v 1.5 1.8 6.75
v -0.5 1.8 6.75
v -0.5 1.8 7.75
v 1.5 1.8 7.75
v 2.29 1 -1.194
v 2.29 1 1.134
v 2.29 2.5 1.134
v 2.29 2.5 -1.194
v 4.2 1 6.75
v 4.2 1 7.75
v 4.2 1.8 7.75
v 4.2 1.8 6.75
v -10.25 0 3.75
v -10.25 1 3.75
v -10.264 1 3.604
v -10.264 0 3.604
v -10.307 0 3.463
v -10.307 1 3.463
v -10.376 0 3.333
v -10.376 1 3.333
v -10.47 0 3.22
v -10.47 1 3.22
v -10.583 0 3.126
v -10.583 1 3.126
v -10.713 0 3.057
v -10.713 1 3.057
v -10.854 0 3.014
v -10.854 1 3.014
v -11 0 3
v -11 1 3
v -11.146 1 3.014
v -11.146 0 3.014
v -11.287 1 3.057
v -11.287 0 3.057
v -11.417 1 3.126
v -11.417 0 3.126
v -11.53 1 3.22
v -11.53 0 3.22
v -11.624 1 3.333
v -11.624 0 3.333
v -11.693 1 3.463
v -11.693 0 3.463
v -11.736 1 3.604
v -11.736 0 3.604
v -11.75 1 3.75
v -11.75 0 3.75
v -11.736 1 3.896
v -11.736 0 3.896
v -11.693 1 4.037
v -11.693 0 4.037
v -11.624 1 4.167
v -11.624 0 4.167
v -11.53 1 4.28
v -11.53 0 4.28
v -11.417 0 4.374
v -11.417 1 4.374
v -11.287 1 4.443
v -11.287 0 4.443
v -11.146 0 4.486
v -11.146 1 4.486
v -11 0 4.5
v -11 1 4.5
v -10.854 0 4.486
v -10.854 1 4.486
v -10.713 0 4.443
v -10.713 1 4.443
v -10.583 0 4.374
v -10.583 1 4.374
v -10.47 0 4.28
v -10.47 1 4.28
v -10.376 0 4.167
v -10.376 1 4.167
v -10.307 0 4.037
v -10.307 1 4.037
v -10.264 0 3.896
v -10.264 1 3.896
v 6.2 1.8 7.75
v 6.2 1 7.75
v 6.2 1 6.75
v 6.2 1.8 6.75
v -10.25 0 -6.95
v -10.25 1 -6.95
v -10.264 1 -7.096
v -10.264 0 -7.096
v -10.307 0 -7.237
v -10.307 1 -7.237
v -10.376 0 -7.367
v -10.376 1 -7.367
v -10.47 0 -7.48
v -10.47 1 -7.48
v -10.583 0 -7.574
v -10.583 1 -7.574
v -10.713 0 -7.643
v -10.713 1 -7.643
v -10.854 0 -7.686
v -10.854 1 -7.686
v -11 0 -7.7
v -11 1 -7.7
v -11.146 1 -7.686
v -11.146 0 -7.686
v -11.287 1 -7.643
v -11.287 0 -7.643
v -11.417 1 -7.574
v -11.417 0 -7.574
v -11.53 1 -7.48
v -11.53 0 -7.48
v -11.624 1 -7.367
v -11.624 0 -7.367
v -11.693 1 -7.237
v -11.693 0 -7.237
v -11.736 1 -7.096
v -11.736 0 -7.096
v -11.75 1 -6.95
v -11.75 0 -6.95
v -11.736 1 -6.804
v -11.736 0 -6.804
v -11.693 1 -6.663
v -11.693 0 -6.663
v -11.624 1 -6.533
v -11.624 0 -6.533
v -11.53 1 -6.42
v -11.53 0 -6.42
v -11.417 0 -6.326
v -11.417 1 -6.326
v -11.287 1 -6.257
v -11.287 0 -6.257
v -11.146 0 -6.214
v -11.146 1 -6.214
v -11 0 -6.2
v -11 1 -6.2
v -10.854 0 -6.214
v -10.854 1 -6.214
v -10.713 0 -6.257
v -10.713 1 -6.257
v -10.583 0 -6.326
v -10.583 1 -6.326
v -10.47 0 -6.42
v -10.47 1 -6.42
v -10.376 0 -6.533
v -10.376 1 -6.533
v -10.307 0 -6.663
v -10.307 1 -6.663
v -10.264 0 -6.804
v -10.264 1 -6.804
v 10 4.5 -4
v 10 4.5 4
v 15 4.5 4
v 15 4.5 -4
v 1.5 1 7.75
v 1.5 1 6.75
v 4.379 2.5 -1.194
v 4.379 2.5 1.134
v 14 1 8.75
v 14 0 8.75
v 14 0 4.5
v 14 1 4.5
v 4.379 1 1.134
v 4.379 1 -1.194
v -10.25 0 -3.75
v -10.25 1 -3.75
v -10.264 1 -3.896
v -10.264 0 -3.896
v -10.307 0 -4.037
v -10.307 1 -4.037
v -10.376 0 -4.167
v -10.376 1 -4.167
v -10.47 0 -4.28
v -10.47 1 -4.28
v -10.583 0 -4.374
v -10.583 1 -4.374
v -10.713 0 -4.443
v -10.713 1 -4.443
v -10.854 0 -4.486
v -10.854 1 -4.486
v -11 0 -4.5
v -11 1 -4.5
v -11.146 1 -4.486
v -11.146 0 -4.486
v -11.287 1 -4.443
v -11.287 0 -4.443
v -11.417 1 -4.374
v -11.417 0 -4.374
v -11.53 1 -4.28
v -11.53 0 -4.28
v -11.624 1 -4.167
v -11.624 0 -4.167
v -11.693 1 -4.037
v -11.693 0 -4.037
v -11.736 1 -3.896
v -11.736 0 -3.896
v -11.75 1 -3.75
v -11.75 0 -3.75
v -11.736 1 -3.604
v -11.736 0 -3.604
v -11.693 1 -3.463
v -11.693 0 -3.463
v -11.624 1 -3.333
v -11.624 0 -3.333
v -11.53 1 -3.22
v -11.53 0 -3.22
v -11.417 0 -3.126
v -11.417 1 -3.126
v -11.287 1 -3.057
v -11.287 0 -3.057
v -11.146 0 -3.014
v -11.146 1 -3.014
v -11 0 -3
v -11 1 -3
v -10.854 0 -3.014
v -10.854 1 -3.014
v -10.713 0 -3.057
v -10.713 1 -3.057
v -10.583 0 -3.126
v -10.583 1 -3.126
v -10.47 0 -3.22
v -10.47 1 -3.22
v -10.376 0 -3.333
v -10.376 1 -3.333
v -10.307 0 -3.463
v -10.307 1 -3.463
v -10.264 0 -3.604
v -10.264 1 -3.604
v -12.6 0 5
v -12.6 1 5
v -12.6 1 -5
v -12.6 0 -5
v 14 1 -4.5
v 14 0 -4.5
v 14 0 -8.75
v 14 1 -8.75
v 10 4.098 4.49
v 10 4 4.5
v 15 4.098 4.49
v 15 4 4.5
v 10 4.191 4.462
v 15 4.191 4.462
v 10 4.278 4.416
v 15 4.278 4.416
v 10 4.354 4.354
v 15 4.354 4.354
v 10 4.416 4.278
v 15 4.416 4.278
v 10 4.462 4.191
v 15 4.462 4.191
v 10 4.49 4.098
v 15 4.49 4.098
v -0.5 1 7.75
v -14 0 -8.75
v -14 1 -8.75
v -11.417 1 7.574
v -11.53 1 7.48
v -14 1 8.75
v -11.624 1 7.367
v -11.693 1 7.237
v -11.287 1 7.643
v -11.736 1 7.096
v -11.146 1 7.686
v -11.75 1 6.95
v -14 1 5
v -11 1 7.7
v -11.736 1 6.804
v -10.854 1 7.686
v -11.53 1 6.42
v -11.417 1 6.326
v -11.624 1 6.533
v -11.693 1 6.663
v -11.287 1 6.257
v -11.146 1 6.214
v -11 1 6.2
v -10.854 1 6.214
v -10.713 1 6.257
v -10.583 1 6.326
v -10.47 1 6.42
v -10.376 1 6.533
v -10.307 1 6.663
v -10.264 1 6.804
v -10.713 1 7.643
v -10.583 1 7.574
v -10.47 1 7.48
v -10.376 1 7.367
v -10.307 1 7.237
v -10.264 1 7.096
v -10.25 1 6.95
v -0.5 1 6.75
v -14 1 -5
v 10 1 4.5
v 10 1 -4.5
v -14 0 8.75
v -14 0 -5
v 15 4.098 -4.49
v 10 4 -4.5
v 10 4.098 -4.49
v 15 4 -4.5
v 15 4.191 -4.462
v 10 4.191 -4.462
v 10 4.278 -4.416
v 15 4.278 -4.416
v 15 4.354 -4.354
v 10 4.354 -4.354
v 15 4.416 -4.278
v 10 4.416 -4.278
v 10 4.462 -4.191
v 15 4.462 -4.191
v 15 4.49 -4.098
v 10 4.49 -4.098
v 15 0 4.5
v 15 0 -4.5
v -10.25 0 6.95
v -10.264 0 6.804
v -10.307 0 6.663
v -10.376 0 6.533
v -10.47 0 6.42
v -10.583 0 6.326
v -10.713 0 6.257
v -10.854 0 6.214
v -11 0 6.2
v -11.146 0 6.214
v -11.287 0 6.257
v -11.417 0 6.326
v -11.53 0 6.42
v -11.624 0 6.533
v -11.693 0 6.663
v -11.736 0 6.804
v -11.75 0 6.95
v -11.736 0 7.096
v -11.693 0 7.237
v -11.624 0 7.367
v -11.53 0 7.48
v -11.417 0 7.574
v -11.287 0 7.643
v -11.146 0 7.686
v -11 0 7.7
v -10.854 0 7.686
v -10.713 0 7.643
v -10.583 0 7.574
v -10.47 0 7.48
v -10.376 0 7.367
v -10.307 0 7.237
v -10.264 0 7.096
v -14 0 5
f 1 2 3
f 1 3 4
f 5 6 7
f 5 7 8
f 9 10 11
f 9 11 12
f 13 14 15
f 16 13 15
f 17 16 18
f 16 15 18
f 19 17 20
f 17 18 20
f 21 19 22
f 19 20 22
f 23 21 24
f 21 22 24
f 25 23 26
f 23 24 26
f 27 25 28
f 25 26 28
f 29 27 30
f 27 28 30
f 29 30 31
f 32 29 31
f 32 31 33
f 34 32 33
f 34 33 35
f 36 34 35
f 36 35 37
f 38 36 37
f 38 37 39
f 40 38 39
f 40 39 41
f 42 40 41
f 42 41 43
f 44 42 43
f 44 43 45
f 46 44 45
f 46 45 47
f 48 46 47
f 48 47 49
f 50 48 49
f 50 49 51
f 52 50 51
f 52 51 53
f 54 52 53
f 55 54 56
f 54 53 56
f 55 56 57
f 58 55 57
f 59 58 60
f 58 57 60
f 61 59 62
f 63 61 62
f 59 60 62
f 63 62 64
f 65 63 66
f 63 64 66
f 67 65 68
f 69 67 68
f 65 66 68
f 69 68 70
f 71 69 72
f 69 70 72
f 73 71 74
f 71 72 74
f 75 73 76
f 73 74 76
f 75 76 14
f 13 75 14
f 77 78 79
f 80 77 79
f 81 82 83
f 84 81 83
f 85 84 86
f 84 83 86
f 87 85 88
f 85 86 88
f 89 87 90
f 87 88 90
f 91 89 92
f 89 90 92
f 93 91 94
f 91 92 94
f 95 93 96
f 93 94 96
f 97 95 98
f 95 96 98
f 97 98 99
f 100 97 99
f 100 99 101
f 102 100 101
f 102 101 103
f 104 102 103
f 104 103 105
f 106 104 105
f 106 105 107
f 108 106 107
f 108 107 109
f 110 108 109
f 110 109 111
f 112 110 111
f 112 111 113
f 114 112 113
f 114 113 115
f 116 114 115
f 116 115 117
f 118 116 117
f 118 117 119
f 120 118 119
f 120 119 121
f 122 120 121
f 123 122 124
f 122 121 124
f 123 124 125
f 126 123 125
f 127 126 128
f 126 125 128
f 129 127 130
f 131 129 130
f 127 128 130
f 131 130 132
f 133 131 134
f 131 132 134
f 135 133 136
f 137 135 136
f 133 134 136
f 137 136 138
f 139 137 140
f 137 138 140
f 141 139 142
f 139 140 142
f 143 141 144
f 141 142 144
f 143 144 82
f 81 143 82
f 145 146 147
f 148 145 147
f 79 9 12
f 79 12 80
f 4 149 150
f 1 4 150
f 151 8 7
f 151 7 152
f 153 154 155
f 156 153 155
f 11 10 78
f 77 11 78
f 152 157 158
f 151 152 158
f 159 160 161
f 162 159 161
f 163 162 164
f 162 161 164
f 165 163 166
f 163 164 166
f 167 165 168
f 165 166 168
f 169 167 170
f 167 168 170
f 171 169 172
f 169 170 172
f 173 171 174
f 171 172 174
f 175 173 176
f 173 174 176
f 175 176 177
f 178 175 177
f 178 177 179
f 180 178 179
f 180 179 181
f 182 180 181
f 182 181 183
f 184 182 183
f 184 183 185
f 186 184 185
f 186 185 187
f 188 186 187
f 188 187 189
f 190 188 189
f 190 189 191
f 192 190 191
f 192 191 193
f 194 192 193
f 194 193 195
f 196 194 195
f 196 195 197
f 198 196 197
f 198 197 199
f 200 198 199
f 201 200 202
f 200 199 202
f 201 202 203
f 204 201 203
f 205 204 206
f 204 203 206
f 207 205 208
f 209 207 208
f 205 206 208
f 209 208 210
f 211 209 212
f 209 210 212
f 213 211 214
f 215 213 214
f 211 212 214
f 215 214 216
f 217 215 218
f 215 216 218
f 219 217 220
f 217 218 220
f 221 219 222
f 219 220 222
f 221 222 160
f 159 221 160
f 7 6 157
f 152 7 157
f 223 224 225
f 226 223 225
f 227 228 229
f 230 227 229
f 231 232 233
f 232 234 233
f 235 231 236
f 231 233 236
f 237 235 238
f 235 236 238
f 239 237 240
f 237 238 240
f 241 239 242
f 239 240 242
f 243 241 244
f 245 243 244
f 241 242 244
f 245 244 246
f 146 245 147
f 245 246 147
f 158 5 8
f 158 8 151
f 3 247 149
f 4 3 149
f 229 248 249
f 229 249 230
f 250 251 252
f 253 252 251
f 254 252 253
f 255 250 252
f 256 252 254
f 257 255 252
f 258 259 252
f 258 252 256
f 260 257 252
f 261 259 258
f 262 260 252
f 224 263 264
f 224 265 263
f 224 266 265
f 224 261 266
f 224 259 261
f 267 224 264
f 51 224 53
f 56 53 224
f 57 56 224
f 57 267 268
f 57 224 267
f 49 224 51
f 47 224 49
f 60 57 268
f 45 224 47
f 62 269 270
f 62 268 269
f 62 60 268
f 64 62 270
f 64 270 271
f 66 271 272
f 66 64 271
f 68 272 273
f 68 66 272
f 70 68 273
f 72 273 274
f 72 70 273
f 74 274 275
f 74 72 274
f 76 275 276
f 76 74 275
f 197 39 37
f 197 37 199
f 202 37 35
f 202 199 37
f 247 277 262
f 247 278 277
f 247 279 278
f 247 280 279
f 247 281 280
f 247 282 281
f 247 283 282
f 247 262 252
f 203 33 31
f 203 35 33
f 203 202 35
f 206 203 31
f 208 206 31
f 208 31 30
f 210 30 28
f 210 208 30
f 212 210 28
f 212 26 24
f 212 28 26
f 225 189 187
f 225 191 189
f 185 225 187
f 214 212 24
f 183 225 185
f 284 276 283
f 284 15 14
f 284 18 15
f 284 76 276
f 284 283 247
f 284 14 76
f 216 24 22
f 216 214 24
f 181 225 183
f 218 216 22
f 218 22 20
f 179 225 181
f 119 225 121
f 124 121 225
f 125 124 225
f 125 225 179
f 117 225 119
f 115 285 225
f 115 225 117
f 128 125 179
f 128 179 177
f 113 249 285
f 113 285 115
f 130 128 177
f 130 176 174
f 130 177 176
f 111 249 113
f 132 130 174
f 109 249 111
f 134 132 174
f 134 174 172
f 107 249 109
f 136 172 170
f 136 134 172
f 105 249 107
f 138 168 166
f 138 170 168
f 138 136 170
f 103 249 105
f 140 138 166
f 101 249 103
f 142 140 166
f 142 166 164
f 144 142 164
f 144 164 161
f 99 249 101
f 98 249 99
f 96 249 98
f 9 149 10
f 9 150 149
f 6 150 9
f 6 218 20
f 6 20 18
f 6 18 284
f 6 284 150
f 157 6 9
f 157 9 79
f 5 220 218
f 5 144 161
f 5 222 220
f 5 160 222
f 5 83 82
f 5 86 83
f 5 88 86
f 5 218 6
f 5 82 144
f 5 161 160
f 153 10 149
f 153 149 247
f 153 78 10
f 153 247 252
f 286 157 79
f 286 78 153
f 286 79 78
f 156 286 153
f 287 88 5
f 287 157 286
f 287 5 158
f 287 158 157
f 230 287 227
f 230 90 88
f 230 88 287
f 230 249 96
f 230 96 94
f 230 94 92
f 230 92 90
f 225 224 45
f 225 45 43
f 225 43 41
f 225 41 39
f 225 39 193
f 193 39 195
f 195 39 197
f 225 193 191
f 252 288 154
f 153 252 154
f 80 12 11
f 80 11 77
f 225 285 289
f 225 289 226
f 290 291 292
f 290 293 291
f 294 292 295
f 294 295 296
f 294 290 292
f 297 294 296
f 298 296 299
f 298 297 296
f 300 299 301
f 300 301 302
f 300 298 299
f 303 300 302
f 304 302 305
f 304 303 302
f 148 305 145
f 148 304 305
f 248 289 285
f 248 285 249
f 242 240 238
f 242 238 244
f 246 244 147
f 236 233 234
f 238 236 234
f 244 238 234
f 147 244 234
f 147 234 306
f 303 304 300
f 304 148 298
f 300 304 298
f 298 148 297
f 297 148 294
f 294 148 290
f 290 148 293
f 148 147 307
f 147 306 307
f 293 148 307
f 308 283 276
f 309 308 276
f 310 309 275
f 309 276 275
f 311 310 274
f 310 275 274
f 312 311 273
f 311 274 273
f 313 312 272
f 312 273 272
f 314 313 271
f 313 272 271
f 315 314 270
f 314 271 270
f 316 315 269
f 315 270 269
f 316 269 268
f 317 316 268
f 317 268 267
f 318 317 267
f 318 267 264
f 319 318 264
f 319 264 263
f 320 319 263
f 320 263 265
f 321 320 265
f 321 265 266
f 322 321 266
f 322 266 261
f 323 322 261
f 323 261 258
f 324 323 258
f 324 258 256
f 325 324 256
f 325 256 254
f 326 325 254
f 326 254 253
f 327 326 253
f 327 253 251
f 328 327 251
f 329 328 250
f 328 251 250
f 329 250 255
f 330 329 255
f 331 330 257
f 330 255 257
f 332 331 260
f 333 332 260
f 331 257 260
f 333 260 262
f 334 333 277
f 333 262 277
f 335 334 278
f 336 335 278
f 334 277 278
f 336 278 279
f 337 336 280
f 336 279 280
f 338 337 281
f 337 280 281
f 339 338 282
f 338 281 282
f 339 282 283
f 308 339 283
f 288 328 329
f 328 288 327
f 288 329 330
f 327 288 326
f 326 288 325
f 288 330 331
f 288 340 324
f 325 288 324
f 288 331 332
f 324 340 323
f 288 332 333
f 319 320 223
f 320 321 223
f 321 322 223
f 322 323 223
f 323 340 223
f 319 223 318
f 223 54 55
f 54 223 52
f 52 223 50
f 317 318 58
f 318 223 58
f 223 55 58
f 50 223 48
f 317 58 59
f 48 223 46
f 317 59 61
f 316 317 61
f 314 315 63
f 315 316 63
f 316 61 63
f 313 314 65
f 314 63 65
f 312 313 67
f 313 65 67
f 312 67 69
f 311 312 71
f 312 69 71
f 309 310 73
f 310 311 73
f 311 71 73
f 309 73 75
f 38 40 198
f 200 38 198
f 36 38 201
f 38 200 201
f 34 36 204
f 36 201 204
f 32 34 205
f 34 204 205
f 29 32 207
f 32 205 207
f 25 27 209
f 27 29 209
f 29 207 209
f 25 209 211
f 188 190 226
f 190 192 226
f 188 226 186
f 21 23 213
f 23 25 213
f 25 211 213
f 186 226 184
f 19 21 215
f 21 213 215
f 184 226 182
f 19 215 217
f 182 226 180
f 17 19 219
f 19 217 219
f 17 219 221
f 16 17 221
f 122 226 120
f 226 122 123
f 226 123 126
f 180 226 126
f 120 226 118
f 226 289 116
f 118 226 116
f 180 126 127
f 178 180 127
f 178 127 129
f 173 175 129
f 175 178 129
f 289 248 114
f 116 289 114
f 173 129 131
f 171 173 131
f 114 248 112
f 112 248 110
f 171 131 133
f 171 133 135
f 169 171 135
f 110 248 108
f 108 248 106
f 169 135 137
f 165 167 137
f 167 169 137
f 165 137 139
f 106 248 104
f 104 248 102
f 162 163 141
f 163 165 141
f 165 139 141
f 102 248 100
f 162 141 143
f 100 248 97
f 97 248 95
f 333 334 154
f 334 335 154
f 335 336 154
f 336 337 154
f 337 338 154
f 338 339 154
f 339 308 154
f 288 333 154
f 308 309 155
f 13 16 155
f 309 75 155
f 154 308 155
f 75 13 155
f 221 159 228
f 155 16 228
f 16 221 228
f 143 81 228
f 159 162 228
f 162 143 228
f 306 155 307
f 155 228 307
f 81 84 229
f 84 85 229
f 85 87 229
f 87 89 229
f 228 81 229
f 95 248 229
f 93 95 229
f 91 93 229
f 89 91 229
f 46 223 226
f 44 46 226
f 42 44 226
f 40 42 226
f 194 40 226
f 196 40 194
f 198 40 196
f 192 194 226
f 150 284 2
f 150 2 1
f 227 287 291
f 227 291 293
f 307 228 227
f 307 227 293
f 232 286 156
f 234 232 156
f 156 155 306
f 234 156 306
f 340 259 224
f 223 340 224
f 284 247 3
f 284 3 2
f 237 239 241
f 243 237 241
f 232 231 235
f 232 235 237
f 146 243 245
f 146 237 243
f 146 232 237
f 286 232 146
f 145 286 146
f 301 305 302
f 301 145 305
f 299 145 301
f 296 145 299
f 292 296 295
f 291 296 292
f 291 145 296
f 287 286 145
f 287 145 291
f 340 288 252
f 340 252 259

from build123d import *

# Parameters (mm, degrees)
SKETCH_1_W             = 28
SKETCH_1_H             = 17.5
EXTRUDE_1_DEPTH        = 1
EXTRUDE_START          = -1
SKETCH_2_W             = 5
SKETCH_2_H             = 9
EXTRUDE_2_DEPTH        = 4.5
FILLET_1_R             = 0.5
SKETCH_3_W             = 2.088904022
SKETCH_3_H             = 2.32763591
EXTRUDE_3_DEPTH        = 1.5
SKETCH_6_W             = 1.4
SKETCH_6_H             = 10
CUT_EXTRUDE_2_DEPTH    = 2
SKETCH_4_R             = 0.75
CUT_EXTRUDE_1_DEPTH    = 2
SKETCH_5_W             = 2
SKETCH_5_H             = 1
EXTRUDE_4_DEPTH        = 1.8
PATTERN_LINEAR_1_COUNT = 2
PATTERN_LINEAR_1_PITCH = 4.7


with BuildPart() as part:
    # 草图1 → 凸台-拉伸1 (new body)
    with BuildSketch(Plane(origin=(0, 0, 0), x_dir=(1, 0, 0), z_dir=(0, 1, 0))):
        Rectangle(SKETCH_1_W, SKETCH_1_H)
    extrude(amount=EXTRUDE_1_DEPTH)

    # 草图2 → 凸台-拉伸2 (add)
    with BuildSketch(Plane(origin=(0, 1, 0), x_dir=(1, 0, 0), z_dir=(0, 1, 0)).offset(EXTRUDE_START)):
        with Locations((12.5, 0)):
            Rectangle(SKETCH_2_W, SKETCH_2_H)
    extrude(amount=EXTRUDE_2_DEPTH)

    # 圆角1
    fillet_1_edges = [part.edges().sort_by_distance(p)[0] for p in [
        (12.5, 4.5, 4.5),
        (12.5, 4.5, -4.5),
    ]]
    fillet(fillet_1_edges, radius=FILLET_1_R)

    # 草图3 → 凸台-拉伸3 (add)
    with BuildSketch(Plane(origin=(0, 1, 0), x_dir=(1, 0, 0), z_dir=(0, 1, 0))):
        with Locations((3.334941172, 0.029841486)):
            Rectangle(SKETCH_3_W, SKETCH_3_H)
    extrude(amount=EXTRUDE_3_DEPTH)

    # 草图6 → 切除-拉伸2 (cut, through all)
    with BuildSketch(Plane(origin=(0, 1, 0), x_dir=(1, 0, 0), z_dir=(0, 1, 0))):
        with Locations((-13.3, 0)):
            Rectangle(SKETCH_6_W, SKETCH_6_H)
    extrude(amount=-CUT_EXTRUDE_2_DEPTH, mode=Mode.SUBTRACT)

    # 草图4 → 切除-拉伸1 (cut, through all)
    with BuildSketch(Plane(origin=(0, 1, 0), x_dir=(1, 0, 0), z_dir=(0, 1, 0))):
        with Locations((-11, 6.95)):
            Circle(SKETCH_4_R)
        with Locations((-11, 3.75)):
            Circle(SKETCH_4_R)
        with Locations((-11, -3.75)):
            Circle(SKETCH_4_R)
        with Locations((-11, -6.95)):
            Circle(SKETCH_4_R)
    extrude(amount=-CUT_EXTRUDE_1_DEPTH, mode=Mode.SUBTRACT)

    # 草图5 → 凸台-拉伸4 (add)
    with BuildSketch(Plane(origin=(0, 1, 0), x_dir=(1, 0, 0), z_dir=(0, 1, 0)).offset(EXTRUDE_START)):
        with Locations((5.2, -7.25)):
            Rectangle(SKETCH_5_W, SKETCH_5_H)
    extrude_4 = extrude(amount=EXTRUDE_4_DEPTH)

    # 阵列(线性)1: 凸台-拉伸4 ×2
    with Locations(*[(-i * PATTERN_LINEAR_1_PITCH, 0, 0) for i in range(1, PATTERN_LINEAR_1_COUNT)]):
        add(extrude_4)


solid = part.part
